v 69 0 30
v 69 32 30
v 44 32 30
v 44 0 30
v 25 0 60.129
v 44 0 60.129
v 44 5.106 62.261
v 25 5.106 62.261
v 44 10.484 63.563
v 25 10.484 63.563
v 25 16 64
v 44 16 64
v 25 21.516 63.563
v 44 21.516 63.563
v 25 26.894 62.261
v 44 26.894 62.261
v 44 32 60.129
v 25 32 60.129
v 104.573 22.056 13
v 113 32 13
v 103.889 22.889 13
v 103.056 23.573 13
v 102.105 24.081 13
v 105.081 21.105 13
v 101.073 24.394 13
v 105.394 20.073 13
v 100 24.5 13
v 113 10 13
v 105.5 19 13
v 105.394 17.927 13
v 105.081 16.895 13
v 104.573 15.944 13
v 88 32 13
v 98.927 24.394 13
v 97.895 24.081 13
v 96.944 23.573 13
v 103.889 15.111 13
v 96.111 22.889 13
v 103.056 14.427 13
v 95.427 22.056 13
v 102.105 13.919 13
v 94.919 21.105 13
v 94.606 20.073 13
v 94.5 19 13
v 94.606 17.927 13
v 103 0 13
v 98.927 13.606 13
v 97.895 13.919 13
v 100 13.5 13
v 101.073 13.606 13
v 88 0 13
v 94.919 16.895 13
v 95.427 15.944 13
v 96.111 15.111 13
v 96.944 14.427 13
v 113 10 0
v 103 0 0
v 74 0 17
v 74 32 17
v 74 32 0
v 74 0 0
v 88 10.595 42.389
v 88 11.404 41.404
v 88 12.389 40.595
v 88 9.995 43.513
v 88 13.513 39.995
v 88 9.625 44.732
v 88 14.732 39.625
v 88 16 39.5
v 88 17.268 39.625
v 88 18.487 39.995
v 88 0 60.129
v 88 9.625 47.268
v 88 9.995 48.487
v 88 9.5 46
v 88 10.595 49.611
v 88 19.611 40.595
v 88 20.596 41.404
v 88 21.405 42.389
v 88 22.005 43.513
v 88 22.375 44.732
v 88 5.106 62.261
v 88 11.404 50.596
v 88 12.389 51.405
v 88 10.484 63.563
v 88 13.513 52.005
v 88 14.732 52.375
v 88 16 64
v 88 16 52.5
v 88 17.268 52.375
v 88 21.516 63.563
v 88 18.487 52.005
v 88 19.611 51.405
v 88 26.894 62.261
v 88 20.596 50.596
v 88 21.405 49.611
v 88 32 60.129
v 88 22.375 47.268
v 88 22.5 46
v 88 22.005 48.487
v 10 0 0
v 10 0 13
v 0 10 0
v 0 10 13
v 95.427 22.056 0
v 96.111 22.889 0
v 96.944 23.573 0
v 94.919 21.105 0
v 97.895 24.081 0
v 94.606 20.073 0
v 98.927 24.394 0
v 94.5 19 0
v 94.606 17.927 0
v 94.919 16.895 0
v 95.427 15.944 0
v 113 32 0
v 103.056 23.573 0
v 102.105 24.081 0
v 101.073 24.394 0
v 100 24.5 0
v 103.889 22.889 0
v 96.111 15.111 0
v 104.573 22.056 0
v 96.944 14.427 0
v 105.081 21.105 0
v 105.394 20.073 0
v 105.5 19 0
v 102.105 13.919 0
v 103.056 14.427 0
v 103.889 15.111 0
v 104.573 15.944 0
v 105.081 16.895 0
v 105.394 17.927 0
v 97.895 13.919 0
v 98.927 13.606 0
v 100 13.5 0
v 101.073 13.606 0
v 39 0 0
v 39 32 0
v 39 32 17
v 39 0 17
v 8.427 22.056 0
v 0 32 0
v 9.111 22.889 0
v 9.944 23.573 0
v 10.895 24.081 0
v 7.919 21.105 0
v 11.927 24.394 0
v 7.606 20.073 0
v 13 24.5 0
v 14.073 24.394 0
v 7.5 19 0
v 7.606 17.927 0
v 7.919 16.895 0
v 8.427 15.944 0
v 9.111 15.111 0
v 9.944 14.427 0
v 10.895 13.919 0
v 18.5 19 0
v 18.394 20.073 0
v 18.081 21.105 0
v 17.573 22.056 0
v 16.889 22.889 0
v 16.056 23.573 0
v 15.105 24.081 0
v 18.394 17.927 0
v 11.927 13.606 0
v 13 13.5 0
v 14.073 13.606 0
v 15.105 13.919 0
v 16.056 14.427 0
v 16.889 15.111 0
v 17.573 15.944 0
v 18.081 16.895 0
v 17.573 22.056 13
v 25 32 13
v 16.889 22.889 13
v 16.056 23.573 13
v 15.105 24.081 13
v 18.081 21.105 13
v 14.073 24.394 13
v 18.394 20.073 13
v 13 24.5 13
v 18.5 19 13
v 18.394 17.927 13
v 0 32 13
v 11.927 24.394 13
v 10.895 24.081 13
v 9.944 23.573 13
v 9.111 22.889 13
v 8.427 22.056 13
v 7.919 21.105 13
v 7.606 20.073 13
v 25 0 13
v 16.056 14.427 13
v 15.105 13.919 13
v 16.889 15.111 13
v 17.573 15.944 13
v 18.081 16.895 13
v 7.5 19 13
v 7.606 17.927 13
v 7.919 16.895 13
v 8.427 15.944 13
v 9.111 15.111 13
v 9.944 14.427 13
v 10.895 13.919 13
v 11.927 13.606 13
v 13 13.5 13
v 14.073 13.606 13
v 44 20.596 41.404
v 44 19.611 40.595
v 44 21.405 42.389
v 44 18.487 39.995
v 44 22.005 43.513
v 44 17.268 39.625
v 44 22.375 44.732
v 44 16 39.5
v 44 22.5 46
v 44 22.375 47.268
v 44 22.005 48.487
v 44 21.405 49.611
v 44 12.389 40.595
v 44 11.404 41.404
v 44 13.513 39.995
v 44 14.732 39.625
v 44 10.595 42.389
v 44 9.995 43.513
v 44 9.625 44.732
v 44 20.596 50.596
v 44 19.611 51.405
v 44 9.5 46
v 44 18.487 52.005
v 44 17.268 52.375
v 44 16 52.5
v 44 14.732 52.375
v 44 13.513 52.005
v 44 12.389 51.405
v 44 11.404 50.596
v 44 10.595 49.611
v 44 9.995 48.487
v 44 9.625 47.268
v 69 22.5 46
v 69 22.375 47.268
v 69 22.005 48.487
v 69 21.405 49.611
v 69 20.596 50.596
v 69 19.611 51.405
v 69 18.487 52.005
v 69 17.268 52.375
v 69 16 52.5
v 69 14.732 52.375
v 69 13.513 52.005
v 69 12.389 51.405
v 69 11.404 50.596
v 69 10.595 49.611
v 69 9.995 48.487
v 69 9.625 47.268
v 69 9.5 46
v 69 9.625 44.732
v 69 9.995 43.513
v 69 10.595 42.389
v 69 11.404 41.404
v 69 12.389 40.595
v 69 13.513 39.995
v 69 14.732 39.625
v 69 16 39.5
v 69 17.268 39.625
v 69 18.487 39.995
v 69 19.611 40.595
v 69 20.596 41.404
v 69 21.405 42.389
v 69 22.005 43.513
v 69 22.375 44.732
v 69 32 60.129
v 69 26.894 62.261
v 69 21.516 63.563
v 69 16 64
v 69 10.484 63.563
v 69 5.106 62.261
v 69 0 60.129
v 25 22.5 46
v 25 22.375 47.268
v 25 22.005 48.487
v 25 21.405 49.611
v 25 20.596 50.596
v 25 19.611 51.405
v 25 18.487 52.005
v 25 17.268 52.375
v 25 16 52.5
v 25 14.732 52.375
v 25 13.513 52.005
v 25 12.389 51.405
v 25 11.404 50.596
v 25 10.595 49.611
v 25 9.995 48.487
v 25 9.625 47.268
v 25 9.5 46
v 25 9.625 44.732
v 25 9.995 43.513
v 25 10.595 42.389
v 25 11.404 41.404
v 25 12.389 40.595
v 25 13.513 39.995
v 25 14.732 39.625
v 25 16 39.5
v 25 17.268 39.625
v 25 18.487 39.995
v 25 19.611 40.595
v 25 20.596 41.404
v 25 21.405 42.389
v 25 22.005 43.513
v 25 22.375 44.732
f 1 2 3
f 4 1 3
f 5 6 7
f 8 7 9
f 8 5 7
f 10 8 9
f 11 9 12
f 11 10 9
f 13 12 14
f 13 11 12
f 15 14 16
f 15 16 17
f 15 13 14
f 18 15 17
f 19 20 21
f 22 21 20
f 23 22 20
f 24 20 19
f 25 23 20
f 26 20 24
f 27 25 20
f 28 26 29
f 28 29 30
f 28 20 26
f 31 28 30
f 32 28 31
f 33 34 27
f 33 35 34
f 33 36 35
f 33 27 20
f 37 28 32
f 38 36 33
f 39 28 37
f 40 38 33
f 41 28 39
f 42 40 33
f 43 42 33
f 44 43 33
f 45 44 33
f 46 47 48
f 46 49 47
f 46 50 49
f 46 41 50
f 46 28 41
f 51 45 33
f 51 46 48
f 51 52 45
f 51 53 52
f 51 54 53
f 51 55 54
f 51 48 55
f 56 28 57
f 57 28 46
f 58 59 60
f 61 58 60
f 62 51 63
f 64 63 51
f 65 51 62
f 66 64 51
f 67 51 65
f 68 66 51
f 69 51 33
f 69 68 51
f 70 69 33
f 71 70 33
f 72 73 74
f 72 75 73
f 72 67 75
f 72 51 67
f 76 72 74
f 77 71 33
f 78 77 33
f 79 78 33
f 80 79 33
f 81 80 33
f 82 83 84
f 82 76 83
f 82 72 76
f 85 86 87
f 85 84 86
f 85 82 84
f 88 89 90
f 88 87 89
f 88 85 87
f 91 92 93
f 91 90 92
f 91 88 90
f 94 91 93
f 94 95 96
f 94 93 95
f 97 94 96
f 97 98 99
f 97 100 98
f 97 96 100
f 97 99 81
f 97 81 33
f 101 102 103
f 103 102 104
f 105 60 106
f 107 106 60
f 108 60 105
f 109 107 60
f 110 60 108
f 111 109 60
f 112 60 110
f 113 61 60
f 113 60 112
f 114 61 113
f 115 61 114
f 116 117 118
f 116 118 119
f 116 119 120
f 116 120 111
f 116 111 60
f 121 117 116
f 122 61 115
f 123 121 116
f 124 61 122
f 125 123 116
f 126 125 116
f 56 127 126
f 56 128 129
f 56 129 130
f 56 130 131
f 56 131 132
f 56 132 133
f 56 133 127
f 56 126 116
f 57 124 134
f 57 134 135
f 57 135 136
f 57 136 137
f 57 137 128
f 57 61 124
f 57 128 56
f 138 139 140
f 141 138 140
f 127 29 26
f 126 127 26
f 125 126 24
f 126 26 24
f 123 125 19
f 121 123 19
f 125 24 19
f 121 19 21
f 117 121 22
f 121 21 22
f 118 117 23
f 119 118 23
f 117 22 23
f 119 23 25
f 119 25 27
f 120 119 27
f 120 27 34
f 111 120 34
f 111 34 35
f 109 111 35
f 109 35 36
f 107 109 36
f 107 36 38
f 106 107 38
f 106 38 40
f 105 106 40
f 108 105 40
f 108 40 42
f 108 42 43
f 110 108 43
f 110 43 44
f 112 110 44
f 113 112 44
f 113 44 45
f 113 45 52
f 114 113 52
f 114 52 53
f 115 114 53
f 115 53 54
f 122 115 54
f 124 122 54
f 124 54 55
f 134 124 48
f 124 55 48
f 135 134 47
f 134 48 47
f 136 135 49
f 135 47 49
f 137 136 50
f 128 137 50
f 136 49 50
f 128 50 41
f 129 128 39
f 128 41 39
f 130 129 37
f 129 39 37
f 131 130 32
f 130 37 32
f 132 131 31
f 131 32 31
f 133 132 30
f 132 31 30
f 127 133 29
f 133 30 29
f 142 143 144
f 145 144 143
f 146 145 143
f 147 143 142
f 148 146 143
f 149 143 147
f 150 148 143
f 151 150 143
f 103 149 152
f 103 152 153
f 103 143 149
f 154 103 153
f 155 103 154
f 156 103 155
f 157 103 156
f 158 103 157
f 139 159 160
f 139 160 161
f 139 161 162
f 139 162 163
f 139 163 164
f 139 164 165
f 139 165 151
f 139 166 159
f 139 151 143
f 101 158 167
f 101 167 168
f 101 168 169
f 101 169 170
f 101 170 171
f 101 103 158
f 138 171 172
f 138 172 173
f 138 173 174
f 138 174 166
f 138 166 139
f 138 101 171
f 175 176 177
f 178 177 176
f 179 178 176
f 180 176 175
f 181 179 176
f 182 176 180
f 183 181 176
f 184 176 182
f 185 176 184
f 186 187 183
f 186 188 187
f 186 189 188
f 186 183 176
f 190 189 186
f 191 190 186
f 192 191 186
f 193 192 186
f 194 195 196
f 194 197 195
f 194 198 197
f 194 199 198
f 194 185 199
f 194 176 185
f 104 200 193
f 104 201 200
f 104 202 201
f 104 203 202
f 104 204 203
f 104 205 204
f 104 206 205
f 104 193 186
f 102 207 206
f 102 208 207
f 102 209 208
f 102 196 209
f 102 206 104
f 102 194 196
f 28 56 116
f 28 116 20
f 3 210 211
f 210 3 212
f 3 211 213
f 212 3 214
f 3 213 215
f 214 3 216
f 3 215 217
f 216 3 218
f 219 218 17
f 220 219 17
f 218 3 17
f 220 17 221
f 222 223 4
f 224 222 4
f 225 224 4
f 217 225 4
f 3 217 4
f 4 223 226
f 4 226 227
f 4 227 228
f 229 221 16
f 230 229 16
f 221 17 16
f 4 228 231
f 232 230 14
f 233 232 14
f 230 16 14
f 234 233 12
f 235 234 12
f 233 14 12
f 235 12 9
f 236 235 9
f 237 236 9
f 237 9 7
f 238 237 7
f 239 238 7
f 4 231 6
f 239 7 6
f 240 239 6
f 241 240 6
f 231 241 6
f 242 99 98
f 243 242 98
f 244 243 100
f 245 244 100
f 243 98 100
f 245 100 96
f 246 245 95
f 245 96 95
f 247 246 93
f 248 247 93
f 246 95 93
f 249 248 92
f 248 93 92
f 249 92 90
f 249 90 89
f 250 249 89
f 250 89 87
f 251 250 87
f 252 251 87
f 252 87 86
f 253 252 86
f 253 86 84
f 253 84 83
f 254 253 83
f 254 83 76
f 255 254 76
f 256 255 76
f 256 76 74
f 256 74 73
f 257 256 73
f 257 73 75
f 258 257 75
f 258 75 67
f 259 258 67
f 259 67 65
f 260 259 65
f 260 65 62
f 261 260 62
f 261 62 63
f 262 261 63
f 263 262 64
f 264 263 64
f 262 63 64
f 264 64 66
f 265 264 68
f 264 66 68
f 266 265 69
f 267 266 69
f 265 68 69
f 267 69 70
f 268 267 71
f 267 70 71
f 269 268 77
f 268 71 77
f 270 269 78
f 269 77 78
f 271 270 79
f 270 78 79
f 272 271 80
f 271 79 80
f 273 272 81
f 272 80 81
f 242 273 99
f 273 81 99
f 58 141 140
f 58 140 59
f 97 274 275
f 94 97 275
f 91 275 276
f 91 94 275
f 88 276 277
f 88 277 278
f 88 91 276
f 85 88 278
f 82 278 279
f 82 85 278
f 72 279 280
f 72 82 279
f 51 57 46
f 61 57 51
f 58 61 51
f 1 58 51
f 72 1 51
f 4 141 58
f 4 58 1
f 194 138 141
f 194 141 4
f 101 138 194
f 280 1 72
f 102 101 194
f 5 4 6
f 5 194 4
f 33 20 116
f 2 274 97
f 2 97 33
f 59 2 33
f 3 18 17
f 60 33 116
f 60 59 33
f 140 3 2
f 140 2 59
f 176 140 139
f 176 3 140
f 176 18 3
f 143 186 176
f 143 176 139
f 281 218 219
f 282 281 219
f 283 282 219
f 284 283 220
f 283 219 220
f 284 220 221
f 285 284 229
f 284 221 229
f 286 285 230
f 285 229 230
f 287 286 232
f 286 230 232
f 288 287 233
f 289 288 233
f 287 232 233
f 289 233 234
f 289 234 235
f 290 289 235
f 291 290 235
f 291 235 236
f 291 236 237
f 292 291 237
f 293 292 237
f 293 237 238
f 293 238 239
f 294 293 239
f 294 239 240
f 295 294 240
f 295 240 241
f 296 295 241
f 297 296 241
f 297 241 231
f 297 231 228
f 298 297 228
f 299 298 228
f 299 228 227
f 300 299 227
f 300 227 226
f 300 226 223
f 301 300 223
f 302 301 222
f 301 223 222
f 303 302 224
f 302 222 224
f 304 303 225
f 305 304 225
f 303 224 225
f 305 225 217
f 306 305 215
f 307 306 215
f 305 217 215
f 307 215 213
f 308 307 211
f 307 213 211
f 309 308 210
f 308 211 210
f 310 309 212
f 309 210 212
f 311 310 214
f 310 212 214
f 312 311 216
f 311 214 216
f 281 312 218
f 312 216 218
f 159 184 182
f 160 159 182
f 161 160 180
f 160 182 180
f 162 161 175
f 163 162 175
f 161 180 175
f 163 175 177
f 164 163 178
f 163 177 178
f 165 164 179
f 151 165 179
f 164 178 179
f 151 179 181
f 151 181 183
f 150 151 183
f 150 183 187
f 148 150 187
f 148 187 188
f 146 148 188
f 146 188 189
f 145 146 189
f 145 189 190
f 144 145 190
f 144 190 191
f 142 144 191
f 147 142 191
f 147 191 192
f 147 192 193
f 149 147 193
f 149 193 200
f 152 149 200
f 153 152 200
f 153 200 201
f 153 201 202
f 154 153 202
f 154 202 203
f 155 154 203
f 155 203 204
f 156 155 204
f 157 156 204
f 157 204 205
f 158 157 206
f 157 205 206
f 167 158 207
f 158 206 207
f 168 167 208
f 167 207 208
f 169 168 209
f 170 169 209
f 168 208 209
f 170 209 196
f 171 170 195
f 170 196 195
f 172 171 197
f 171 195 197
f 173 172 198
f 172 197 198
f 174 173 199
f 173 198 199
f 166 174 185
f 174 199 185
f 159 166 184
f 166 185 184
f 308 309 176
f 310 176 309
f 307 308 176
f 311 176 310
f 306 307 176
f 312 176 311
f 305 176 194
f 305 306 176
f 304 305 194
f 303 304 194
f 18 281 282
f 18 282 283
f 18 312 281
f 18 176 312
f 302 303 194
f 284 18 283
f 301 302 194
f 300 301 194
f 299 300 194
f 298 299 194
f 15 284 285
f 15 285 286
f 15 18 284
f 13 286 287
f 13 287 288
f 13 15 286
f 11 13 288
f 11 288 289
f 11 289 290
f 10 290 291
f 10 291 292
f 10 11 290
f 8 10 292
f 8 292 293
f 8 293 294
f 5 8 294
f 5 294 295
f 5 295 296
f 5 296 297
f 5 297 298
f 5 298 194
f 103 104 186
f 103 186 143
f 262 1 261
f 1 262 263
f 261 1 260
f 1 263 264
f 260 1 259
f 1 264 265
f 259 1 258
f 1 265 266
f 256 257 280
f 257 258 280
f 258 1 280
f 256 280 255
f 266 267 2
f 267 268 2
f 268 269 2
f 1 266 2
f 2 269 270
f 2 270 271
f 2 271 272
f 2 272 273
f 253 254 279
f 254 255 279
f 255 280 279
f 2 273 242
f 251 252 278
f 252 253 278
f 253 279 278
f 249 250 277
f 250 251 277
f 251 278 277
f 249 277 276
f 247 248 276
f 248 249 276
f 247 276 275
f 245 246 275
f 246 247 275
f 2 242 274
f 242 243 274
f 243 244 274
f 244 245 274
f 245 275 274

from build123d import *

# Parameters (mm, degrees)
F1_DEPTH  = 32
F3_DEPTH  = 25
F5_DEPTH  = 25
F7_DEPTH  = 19
F9_DEPTH  = 19
F10_R     = 6.5
F11_DEPTH = 100
F12_R     = 5.5
F13_DEPTH = 25
F14_R     = 5.5
F15_DEPTH = 25


with BuildPart() as f1:
    # F0 (on Front) → F1 (new body)
    with BuildSketch(Plane.XZ):
        Polygon((0, 13), (0, 0), (39, 0), (39, 17), (74, 17), (74, 0), (113, 0), (113, 13), (88, 13), (88, 30), (39, 30), (25, 30), (25, 13), align=None)
    extrude(amount=-F1_DEPTH)

    # F2 (on face) → F3 (cut)
    with BuildSketch(Plane.XY.offset(13)):
        Polygon((113, 10), (103, 0), (113, 0), align=None)
    extrude(amount=-F3_DEPTH, mode=Mode.SUBTRACT)

    # F4 (on face) → F5 (cut)
    with BuildSketch(Plane.XY.offset(13)):
        Polygon((0, 0), (10, 0), (0, 10), align=None)
    extrude(amount=-F5_DEPTH, mode=Mode.SUBTRACT)

    # F6 (on face) → F7 (join)
    with BuildSketch(Plane.YZ.offset(88)):
        with BuildLine():
            Line((0, 60.128765), (0, 30))
            Line((0, 30), (32, 30))
            Line((32, 30), (32, 60.128765))
            ThreePointArc((32, 60.128765), (16, 64), (0, 60.128765))
        make_face()
    extrude(amount=-F7_DEPTH)

    # F8 (on face) → F9 (join)
    with BuildSketch(Plane(origin=(25, 0, 0), x_dir=(0, -1, 0), z_dir=(-1, 0, 0))):
        with BuildLine():
            Line((-32, 60.128765), (-32, 30))
            Line((-32, 30), (0, 30))
            Line((0, 30), (0, 60.128765))
            ThreePointArc((0, 60.128765), (-16, 64), (-32, 60.128765))
        make_face()
    extrude(amount=-F9_DEPTH)

    # F10 (on face) → F11 (cut)
    with BuildSketch(Plane.YZ.offset(88)):
        with Locations((16, 46)):
            Circle(F10_R)
    extrude(amount=-F11_DEPTH, mode=Mode.SUBTRACT)

    # F12 (on face) → F13 (cut)
    with BuildSketch(Plane.XY.offset(13)):
        with Locations((100, 19)):
            Circle(F12_R)
    extrude(amount=-F13_DEPTH, mode=Mode.SUBTRACT)

    # F14 (on face) → F15 (cut)
    with BuildSketch(Plane.XY.offset(13)):
        with Locations((13, 19)):
            Circle(F14_R)
    extrude(amount=-F15_DEPTH, mode=Mode.SUBTRACT)


solid = f1.part
